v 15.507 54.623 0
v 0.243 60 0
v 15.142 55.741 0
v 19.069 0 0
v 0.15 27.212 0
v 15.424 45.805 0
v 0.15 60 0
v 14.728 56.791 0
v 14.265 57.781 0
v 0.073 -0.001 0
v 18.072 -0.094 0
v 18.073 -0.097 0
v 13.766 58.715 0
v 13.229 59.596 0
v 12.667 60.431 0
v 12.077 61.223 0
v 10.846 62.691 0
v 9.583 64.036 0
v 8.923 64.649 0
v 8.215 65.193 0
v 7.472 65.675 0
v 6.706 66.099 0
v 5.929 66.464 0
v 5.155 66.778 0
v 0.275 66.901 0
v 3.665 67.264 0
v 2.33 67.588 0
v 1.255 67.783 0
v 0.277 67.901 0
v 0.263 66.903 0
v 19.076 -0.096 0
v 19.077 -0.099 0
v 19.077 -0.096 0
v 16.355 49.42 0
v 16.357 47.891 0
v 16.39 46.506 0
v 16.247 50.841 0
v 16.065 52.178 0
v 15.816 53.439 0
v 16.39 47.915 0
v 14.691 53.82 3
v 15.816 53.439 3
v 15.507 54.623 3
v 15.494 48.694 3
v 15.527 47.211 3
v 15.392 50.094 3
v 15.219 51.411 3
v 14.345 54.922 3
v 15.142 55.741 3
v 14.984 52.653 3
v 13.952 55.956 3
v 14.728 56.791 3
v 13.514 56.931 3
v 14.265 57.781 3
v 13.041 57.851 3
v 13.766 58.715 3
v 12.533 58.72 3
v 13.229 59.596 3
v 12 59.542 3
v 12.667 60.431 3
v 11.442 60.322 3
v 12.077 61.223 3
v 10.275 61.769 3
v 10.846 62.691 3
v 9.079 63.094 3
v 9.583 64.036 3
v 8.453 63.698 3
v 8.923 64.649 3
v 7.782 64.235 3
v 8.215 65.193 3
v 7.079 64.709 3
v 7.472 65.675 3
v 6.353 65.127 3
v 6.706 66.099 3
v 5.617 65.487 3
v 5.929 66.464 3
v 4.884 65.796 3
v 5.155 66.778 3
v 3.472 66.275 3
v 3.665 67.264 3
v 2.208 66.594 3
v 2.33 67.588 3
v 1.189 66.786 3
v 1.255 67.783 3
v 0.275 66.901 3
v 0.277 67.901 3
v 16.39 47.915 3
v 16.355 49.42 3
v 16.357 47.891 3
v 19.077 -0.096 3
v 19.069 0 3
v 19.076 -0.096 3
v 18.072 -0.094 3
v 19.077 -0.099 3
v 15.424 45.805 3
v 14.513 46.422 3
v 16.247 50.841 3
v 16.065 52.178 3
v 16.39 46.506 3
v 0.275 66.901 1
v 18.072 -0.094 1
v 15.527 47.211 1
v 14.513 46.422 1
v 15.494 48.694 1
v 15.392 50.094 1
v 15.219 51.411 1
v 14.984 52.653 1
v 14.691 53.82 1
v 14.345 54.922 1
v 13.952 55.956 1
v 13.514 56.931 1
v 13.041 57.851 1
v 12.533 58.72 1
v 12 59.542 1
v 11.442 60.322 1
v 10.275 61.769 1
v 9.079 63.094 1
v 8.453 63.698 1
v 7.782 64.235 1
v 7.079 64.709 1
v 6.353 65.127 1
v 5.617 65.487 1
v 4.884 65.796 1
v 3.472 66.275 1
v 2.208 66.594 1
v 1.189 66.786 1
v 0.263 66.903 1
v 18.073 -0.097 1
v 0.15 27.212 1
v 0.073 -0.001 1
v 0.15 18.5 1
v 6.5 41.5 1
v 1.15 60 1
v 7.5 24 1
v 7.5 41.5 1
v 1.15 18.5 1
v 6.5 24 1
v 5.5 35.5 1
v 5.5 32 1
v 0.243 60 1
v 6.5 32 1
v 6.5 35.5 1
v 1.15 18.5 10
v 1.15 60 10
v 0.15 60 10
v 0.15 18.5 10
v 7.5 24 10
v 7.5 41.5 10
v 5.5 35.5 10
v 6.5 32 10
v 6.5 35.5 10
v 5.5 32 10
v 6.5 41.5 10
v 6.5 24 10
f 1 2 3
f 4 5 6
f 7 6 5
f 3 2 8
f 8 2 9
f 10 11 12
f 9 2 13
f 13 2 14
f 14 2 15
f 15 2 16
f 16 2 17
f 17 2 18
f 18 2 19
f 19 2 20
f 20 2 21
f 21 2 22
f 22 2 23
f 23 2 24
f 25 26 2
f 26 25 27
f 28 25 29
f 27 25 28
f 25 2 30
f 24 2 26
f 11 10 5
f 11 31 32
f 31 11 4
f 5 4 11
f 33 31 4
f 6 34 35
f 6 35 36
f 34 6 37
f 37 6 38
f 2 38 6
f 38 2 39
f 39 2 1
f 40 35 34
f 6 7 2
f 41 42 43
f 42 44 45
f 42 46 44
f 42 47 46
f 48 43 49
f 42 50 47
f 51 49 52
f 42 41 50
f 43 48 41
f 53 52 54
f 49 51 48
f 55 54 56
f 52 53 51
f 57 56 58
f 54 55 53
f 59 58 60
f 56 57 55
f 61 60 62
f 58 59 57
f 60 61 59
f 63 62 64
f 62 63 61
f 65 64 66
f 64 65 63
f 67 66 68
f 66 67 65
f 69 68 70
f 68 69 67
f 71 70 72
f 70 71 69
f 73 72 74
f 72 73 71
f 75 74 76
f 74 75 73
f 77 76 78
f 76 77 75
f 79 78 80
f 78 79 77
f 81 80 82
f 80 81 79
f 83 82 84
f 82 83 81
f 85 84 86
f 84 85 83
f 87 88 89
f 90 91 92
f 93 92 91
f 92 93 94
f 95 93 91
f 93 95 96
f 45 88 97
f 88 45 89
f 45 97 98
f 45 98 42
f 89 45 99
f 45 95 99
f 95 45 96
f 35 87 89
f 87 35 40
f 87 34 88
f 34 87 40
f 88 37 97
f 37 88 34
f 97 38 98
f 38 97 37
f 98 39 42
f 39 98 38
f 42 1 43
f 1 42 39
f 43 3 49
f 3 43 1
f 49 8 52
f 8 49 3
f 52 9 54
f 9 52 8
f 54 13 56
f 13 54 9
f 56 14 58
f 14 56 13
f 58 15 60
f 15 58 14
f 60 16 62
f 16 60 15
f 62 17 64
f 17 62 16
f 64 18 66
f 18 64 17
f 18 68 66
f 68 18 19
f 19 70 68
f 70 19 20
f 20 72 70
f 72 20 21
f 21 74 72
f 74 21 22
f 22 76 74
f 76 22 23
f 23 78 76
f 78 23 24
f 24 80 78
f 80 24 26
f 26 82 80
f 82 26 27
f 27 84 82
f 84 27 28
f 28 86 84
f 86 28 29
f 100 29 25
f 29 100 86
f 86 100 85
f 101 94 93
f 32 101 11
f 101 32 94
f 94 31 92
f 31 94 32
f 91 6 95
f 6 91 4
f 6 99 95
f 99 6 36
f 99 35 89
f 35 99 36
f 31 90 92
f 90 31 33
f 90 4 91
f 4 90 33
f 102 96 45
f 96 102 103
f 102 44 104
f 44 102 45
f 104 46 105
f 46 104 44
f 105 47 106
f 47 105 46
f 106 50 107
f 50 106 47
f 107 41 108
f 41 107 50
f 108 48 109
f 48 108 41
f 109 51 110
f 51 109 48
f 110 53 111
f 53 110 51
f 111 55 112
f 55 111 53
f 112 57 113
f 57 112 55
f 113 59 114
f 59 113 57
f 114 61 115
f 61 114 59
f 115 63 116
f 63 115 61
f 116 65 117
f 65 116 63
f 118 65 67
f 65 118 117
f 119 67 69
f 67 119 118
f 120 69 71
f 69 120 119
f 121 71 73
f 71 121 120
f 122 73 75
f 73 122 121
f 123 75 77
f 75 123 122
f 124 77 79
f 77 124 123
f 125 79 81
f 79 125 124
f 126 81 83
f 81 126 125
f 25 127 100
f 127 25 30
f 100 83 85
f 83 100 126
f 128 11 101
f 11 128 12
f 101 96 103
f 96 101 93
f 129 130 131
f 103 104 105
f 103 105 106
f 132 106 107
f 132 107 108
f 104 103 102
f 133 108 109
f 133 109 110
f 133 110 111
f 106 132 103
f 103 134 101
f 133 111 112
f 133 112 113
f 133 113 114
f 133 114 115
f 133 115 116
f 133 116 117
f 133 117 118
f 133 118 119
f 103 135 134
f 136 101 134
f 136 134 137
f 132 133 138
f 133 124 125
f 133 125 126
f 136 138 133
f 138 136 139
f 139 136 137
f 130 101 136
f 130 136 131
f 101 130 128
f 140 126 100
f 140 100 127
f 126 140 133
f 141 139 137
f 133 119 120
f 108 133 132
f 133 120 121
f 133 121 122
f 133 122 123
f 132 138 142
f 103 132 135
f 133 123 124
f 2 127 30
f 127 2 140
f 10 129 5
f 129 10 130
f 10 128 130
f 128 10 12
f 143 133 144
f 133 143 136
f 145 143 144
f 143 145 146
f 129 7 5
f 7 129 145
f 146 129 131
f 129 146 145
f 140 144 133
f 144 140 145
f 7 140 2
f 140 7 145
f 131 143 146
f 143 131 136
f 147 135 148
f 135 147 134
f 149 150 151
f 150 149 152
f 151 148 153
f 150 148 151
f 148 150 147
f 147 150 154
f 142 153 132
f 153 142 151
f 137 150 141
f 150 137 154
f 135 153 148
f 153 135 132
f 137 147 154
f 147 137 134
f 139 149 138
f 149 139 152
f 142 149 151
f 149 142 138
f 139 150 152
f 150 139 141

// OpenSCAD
module shape() {
     resize([18, 67]) translate([0.2, -0.1655, 0]) mirror() polygon([[0.095, 25.969], [0.171, 0.165], [-7.02, 0.128], [-5.598, 18.07], [-6.003, 18.374], [-5.99, 18.946], [-5.949, 19.486], [-5.88, 19.994], [-5.786, 20.473], [-5.669, 20.923], [-5.531, 21.348], [-5.374, 21.747], [-5.199, 22.123], [-5.01, 22.478], [-4.807, 22.813], [-4.594, 23.13], [-4.371, 23.431], [-3.905, 23.989], [-3.427, 24.5], [-3.177, 24.733], [-2.909, 24.94], [-2.628, 25.123], [-2.338, 25.284], [-2.044, 25.423], [-1.751, 25.542], [-1.187, 25.727], [-0.682, 25.85], [-0.275, 25.924], [0.095, 25.969]]);
}

difference() {
     union() {
          linear_extrude(3) resize([19, 68]) shape();
          translate([0, 0, 0]) linear_extrude(3) resize([19, 66]) shape();
     }
     linear_extrude(3) shape();
}

linear_extrude(1) shape();

translate([0.15, 18.5, 0]) cube([1, 41.5, 10]);
translate([6.5, 24, 0]) cube([1, 17.5, 10]);
translate([5.5, 32, 0]) cube([1, 3.5, 10]);
